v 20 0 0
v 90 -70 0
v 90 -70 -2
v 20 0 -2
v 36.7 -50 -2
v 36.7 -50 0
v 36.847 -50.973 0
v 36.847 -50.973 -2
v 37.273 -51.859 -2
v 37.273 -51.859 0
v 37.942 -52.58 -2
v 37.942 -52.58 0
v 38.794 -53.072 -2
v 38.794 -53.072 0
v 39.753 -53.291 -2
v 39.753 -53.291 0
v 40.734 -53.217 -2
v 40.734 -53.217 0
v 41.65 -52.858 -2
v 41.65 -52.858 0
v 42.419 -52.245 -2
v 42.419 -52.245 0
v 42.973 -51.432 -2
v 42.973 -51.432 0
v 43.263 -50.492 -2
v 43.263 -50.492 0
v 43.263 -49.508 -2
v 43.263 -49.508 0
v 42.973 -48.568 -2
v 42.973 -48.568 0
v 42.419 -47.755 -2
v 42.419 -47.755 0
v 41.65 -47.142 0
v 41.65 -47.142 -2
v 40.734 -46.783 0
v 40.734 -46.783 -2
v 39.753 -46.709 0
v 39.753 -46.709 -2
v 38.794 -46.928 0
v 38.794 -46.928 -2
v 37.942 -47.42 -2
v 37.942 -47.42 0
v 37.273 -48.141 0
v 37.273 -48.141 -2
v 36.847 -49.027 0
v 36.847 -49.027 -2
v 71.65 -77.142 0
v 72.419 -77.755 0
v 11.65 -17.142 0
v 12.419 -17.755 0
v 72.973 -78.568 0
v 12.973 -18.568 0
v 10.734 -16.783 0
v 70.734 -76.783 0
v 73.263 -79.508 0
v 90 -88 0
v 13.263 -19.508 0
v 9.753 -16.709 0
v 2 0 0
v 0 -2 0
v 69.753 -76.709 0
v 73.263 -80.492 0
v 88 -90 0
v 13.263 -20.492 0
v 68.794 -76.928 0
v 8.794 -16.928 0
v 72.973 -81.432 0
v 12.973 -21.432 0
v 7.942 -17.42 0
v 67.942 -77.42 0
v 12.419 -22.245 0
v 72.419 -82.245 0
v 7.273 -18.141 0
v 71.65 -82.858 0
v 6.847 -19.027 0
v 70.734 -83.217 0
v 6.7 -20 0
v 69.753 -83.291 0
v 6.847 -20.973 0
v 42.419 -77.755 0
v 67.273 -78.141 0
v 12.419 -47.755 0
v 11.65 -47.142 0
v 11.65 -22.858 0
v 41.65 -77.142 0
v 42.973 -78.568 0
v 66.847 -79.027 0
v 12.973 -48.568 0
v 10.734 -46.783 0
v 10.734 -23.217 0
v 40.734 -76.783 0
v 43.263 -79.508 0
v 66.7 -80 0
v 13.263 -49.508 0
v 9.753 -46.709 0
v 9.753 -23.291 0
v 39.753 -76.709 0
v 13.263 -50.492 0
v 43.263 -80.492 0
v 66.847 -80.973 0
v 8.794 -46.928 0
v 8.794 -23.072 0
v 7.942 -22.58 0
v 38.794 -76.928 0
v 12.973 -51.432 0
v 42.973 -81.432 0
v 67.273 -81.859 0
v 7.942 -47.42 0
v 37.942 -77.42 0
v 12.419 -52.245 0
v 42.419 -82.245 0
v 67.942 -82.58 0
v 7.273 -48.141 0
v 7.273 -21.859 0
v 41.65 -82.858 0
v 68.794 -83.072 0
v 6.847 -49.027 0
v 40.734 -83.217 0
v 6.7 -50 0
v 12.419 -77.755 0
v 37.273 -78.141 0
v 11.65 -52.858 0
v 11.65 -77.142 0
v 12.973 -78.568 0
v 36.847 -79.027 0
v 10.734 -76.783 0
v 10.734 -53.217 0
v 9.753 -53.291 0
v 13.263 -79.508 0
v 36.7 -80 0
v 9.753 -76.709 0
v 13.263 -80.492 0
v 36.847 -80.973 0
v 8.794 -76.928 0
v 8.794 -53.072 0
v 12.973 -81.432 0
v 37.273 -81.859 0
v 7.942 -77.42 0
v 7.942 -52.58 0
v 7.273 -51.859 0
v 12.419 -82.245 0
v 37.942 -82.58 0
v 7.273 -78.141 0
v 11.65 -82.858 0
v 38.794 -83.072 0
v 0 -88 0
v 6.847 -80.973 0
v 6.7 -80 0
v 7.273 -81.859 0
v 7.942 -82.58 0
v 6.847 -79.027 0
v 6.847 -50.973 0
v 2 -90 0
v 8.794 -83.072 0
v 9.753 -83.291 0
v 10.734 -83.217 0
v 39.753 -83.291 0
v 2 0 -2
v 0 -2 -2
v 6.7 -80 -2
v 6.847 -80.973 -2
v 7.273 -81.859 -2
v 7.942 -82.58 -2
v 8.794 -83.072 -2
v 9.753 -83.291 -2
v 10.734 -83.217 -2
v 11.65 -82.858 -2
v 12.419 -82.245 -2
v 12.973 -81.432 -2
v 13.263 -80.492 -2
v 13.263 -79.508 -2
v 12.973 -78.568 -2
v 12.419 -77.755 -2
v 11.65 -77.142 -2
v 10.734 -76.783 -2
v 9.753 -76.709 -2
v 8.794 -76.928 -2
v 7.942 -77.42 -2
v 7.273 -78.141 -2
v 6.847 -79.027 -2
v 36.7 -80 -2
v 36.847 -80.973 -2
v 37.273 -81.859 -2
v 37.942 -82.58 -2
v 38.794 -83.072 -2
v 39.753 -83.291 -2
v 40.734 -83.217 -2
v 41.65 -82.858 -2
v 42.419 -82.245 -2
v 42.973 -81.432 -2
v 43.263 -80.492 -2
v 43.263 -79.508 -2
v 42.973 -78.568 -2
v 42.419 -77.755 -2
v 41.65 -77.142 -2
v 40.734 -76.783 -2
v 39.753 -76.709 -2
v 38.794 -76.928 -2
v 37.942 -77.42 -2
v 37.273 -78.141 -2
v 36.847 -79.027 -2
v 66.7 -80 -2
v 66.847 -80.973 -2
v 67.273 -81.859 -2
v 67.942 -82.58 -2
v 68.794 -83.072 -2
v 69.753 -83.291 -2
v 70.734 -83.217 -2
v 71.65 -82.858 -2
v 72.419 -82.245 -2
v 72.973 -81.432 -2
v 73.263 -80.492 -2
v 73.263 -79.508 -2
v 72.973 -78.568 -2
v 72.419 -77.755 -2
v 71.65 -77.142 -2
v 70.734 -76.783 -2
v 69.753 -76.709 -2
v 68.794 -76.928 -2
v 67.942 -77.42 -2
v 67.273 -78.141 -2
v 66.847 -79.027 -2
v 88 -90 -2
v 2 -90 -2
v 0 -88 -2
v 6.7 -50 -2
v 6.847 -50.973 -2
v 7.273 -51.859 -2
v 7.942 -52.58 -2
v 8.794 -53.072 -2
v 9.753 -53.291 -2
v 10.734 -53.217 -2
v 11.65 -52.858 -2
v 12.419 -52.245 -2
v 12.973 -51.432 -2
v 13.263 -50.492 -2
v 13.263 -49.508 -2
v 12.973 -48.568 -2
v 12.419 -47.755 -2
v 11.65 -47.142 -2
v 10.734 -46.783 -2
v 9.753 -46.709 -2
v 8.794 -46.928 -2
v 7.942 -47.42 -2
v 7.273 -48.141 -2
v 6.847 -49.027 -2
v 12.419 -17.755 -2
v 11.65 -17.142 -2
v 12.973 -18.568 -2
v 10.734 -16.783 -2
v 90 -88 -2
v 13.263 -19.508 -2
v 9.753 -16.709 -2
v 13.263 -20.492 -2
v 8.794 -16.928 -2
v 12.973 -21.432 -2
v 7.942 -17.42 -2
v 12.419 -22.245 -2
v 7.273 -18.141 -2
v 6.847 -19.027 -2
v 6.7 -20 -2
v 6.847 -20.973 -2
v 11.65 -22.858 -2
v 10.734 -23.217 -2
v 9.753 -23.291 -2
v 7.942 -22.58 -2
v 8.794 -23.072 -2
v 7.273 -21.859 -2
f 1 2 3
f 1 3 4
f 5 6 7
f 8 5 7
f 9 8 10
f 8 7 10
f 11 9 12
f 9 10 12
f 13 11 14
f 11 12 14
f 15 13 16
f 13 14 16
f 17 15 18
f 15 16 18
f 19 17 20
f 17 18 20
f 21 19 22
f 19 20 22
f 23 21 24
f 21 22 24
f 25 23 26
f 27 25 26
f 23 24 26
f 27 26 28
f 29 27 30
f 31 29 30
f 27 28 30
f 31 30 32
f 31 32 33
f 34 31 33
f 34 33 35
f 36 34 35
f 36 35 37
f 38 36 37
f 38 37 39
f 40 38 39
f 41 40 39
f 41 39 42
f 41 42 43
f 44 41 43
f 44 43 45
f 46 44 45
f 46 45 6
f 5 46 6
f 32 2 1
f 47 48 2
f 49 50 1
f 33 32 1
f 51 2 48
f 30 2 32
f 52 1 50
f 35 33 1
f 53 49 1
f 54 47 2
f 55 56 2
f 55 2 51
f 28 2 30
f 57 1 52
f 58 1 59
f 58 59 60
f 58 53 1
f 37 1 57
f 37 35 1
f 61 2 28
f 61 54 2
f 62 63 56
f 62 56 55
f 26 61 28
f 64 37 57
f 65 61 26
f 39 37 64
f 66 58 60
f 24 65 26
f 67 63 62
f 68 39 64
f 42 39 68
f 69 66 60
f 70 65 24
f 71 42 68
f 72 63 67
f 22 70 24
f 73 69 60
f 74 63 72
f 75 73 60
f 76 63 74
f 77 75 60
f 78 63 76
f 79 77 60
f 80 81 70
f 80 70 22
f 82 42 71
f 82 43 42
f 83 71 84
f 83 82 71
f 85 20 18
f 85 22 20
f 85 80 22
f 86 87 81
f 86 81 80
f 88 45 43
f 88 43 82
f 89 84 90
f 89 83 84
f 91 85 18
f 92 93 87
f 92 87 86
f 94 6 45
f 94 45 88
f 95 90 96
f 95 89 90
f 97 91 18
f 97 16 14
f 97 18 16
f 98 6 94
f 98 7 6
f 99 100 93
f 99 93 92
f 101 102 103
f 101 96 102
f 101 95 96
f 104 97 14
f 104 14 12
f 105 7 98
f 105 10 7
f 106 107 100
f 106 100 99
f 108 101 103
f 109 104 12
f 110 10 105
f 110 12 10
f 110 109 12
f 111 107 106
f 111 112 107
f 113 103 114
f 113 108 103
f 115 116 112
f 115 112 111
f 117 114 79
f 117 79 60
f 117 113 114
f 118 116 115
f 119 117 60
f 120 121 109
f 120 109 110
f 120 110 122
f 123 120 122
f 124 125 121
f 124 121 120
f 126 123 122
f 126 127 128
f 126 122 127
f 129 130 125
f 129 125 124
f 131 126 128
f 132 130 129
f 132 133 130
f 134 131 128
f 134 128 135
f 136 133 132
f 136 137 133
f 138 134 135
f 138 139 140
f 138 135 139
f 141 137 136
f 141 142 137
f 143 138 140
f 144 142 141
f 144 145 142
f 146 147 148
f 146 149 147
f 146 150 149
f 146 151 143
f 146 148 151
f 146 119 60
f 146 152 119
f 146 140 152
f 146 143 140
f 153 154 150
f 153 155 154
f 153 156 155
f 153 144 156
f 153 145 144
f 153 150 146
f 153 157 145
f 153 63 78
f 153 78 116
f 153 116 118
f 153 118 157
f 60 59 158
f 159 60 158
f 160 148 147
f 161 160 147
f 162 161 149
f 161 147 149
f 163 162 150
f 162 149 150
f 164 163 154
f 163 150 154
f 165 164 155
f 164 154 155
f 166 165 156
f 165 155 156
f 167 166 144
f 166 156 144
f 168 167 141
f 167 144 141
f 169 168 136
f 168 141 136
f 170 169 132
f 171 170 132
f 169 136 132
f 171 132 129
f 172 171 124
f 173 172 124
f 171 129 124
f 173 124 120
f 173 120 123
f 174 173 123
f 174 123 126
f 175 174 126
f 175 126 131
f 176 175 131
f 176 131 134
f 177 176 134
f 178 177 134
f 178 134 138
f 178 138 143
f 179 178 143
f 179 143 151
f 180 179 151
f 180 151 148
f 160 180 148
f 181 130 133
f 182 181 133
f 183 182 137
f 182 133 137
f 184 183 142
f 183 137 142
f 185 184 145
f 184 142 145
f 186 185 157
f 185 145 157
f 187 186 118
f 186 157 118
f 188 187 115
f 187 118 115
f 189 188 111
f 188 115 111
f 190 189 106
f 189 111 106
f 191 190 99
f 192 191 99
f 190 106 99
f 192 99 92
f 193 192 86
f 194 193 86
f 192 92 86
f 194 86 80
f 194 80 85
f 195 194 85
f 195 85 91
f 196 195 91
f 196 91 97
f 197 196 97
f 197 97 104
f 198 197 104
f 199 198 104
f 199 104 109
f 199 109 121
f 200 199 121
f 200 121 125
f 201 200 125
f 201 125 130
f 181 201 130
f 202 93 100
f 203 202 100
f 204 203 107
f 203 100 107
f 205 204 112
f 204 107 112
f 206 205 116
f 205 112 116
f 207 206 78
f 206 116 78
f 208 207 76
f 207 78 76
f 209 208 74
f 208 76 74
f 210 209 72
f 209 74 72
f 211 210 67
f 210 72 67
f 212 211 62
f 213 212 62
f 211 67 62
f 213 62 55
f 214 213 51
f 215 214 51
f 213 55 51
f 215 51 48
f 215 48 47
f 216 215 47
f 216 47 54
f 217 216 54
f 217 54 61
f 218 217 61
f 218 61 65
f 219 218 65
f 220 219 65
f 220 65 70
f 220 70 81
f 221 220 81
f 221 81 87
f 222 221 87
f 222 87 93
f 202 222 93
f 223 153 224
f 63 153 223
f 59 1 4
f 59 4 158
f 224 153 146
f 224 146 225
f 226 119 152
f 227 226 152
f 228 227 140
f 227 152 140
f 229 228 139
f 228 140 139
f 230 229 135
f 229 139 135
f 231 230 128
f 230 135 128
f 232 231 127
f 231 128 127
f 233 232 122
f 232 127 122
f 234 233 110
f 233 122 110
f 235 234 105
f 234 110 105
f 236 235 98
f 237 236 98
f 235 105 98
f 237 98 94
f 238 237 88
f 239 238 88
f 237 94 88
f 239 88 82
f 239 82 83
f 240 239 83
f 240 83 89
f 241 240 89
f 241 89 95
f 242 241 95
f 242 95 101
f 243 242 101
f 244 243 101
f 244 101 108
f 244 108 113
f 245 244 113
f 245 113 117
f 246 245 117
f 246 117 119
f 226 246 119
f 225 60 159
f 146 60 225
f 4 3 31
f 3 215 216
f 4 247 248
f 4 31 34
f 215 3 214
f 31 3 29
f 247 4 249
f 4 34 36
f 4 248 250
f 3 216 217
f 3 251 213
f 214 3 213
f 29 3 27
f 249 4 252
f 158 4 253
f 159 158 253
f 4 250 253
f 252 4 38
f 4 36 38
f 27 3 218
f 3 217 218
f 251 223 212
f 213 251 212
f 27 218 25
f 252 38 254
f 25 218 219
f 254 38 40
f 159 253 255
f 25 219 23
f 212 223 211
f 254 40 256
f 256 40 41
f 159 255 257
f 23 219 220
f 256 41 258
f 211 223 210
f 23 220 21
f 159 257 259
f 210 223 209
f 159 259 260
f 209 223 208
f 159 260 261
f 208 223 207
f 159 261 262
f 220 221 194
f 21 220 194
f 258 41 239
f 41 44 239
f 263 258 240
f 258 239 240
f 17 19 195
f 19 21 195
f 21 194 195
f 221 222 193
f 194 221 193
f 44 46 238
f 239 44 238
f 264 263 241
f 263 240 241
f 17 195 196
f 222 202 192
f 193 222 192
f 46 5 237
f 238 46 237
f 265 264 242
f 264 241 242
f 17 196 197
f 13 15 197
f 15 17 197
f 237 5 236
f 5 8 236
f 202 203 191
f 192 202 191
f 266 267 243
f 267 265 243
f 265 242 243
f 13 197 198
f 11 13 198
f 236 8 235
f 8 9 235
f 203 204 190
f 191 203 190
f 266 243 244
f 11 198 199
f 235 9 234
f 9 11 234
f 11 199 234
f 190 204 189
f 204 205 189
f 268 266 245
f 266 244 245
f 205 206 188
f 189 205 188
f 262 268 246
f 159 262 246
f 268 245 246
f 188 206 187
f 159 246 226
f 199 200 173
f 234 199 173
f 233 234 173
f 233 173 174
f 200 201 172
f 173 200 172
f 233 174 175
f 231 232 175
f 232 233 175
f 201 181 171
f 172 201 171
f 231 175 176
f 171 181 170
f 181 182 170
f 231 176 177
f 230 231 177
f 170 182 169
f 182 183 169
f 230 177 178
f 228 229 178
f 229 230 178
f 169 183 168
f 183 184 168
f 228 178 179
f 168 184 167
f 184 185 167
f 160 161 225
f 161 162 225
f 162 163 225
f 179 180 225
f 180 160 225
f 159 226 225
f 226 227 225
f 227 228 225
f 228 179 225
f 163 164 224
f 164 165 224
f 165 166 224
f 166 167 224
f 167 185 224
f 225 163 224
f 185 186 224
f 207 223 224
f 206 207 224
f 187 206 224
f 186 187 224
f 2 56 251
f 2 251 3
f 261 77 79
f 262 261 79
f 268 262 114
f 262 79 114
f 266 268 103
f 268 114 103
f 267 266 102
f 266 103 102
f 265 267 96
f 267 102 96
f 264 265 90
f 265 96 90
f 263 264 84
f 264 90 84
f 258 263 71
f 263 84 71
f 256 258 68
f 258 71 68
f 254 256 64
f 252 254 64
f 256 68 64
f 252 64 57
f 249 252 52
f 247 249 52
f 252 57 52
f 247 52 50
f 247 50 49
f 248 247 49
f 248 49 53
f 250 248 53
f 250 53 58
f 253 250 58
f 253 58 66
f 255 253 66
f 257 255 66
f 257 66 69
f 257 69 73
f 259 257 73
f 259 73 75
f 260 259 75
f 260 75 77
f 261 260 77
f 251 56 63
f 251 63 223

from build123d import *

# Parameters (mm, degrees)
EXTRUDE_1_DEPTH   = 2
HOLE_WIZARD_M61_D = 6.6
CHAMFER_1_SIZE    = 2


with BuildPart() as part:
    # Эскиз1 → Бобышка-Вытянуть1 (new body)
    with BuildSketch(Plane(origin=(0, 0, 0), x_dir=(1, 0, 0), z_dir=(0, 0, -1))):
        Polygon((0, 0), (0, 90), (90, 90), (90, 70), (20, 0), align=None)
    extrude(amount=EXTRUDE_1_DEPTH)

    # Отверстие с зазором M61 (through all)
    with Locations(Plane(origin=(0, 0, -2), x_dir=(1, 0, 0), z_dir=(0, 0, -1))):
        with Locations((40, 80), (10, 80), (10, 50), (10, 20), (70, 80), (40, 50)):
            Hole(HOLE_WIZARD_M61_D / 2)

    # Фаска1
    chamfer_1_edges = [part.edges().sort_by_distance(p)[0] for p in [
        (0, 0, -1),
        (0, -90, -1),
        (90, -90, -1),
    ]]
    chamfer(chamfer_1_edges, length=CHAMFER_1_SIZE)


solid = part.part
